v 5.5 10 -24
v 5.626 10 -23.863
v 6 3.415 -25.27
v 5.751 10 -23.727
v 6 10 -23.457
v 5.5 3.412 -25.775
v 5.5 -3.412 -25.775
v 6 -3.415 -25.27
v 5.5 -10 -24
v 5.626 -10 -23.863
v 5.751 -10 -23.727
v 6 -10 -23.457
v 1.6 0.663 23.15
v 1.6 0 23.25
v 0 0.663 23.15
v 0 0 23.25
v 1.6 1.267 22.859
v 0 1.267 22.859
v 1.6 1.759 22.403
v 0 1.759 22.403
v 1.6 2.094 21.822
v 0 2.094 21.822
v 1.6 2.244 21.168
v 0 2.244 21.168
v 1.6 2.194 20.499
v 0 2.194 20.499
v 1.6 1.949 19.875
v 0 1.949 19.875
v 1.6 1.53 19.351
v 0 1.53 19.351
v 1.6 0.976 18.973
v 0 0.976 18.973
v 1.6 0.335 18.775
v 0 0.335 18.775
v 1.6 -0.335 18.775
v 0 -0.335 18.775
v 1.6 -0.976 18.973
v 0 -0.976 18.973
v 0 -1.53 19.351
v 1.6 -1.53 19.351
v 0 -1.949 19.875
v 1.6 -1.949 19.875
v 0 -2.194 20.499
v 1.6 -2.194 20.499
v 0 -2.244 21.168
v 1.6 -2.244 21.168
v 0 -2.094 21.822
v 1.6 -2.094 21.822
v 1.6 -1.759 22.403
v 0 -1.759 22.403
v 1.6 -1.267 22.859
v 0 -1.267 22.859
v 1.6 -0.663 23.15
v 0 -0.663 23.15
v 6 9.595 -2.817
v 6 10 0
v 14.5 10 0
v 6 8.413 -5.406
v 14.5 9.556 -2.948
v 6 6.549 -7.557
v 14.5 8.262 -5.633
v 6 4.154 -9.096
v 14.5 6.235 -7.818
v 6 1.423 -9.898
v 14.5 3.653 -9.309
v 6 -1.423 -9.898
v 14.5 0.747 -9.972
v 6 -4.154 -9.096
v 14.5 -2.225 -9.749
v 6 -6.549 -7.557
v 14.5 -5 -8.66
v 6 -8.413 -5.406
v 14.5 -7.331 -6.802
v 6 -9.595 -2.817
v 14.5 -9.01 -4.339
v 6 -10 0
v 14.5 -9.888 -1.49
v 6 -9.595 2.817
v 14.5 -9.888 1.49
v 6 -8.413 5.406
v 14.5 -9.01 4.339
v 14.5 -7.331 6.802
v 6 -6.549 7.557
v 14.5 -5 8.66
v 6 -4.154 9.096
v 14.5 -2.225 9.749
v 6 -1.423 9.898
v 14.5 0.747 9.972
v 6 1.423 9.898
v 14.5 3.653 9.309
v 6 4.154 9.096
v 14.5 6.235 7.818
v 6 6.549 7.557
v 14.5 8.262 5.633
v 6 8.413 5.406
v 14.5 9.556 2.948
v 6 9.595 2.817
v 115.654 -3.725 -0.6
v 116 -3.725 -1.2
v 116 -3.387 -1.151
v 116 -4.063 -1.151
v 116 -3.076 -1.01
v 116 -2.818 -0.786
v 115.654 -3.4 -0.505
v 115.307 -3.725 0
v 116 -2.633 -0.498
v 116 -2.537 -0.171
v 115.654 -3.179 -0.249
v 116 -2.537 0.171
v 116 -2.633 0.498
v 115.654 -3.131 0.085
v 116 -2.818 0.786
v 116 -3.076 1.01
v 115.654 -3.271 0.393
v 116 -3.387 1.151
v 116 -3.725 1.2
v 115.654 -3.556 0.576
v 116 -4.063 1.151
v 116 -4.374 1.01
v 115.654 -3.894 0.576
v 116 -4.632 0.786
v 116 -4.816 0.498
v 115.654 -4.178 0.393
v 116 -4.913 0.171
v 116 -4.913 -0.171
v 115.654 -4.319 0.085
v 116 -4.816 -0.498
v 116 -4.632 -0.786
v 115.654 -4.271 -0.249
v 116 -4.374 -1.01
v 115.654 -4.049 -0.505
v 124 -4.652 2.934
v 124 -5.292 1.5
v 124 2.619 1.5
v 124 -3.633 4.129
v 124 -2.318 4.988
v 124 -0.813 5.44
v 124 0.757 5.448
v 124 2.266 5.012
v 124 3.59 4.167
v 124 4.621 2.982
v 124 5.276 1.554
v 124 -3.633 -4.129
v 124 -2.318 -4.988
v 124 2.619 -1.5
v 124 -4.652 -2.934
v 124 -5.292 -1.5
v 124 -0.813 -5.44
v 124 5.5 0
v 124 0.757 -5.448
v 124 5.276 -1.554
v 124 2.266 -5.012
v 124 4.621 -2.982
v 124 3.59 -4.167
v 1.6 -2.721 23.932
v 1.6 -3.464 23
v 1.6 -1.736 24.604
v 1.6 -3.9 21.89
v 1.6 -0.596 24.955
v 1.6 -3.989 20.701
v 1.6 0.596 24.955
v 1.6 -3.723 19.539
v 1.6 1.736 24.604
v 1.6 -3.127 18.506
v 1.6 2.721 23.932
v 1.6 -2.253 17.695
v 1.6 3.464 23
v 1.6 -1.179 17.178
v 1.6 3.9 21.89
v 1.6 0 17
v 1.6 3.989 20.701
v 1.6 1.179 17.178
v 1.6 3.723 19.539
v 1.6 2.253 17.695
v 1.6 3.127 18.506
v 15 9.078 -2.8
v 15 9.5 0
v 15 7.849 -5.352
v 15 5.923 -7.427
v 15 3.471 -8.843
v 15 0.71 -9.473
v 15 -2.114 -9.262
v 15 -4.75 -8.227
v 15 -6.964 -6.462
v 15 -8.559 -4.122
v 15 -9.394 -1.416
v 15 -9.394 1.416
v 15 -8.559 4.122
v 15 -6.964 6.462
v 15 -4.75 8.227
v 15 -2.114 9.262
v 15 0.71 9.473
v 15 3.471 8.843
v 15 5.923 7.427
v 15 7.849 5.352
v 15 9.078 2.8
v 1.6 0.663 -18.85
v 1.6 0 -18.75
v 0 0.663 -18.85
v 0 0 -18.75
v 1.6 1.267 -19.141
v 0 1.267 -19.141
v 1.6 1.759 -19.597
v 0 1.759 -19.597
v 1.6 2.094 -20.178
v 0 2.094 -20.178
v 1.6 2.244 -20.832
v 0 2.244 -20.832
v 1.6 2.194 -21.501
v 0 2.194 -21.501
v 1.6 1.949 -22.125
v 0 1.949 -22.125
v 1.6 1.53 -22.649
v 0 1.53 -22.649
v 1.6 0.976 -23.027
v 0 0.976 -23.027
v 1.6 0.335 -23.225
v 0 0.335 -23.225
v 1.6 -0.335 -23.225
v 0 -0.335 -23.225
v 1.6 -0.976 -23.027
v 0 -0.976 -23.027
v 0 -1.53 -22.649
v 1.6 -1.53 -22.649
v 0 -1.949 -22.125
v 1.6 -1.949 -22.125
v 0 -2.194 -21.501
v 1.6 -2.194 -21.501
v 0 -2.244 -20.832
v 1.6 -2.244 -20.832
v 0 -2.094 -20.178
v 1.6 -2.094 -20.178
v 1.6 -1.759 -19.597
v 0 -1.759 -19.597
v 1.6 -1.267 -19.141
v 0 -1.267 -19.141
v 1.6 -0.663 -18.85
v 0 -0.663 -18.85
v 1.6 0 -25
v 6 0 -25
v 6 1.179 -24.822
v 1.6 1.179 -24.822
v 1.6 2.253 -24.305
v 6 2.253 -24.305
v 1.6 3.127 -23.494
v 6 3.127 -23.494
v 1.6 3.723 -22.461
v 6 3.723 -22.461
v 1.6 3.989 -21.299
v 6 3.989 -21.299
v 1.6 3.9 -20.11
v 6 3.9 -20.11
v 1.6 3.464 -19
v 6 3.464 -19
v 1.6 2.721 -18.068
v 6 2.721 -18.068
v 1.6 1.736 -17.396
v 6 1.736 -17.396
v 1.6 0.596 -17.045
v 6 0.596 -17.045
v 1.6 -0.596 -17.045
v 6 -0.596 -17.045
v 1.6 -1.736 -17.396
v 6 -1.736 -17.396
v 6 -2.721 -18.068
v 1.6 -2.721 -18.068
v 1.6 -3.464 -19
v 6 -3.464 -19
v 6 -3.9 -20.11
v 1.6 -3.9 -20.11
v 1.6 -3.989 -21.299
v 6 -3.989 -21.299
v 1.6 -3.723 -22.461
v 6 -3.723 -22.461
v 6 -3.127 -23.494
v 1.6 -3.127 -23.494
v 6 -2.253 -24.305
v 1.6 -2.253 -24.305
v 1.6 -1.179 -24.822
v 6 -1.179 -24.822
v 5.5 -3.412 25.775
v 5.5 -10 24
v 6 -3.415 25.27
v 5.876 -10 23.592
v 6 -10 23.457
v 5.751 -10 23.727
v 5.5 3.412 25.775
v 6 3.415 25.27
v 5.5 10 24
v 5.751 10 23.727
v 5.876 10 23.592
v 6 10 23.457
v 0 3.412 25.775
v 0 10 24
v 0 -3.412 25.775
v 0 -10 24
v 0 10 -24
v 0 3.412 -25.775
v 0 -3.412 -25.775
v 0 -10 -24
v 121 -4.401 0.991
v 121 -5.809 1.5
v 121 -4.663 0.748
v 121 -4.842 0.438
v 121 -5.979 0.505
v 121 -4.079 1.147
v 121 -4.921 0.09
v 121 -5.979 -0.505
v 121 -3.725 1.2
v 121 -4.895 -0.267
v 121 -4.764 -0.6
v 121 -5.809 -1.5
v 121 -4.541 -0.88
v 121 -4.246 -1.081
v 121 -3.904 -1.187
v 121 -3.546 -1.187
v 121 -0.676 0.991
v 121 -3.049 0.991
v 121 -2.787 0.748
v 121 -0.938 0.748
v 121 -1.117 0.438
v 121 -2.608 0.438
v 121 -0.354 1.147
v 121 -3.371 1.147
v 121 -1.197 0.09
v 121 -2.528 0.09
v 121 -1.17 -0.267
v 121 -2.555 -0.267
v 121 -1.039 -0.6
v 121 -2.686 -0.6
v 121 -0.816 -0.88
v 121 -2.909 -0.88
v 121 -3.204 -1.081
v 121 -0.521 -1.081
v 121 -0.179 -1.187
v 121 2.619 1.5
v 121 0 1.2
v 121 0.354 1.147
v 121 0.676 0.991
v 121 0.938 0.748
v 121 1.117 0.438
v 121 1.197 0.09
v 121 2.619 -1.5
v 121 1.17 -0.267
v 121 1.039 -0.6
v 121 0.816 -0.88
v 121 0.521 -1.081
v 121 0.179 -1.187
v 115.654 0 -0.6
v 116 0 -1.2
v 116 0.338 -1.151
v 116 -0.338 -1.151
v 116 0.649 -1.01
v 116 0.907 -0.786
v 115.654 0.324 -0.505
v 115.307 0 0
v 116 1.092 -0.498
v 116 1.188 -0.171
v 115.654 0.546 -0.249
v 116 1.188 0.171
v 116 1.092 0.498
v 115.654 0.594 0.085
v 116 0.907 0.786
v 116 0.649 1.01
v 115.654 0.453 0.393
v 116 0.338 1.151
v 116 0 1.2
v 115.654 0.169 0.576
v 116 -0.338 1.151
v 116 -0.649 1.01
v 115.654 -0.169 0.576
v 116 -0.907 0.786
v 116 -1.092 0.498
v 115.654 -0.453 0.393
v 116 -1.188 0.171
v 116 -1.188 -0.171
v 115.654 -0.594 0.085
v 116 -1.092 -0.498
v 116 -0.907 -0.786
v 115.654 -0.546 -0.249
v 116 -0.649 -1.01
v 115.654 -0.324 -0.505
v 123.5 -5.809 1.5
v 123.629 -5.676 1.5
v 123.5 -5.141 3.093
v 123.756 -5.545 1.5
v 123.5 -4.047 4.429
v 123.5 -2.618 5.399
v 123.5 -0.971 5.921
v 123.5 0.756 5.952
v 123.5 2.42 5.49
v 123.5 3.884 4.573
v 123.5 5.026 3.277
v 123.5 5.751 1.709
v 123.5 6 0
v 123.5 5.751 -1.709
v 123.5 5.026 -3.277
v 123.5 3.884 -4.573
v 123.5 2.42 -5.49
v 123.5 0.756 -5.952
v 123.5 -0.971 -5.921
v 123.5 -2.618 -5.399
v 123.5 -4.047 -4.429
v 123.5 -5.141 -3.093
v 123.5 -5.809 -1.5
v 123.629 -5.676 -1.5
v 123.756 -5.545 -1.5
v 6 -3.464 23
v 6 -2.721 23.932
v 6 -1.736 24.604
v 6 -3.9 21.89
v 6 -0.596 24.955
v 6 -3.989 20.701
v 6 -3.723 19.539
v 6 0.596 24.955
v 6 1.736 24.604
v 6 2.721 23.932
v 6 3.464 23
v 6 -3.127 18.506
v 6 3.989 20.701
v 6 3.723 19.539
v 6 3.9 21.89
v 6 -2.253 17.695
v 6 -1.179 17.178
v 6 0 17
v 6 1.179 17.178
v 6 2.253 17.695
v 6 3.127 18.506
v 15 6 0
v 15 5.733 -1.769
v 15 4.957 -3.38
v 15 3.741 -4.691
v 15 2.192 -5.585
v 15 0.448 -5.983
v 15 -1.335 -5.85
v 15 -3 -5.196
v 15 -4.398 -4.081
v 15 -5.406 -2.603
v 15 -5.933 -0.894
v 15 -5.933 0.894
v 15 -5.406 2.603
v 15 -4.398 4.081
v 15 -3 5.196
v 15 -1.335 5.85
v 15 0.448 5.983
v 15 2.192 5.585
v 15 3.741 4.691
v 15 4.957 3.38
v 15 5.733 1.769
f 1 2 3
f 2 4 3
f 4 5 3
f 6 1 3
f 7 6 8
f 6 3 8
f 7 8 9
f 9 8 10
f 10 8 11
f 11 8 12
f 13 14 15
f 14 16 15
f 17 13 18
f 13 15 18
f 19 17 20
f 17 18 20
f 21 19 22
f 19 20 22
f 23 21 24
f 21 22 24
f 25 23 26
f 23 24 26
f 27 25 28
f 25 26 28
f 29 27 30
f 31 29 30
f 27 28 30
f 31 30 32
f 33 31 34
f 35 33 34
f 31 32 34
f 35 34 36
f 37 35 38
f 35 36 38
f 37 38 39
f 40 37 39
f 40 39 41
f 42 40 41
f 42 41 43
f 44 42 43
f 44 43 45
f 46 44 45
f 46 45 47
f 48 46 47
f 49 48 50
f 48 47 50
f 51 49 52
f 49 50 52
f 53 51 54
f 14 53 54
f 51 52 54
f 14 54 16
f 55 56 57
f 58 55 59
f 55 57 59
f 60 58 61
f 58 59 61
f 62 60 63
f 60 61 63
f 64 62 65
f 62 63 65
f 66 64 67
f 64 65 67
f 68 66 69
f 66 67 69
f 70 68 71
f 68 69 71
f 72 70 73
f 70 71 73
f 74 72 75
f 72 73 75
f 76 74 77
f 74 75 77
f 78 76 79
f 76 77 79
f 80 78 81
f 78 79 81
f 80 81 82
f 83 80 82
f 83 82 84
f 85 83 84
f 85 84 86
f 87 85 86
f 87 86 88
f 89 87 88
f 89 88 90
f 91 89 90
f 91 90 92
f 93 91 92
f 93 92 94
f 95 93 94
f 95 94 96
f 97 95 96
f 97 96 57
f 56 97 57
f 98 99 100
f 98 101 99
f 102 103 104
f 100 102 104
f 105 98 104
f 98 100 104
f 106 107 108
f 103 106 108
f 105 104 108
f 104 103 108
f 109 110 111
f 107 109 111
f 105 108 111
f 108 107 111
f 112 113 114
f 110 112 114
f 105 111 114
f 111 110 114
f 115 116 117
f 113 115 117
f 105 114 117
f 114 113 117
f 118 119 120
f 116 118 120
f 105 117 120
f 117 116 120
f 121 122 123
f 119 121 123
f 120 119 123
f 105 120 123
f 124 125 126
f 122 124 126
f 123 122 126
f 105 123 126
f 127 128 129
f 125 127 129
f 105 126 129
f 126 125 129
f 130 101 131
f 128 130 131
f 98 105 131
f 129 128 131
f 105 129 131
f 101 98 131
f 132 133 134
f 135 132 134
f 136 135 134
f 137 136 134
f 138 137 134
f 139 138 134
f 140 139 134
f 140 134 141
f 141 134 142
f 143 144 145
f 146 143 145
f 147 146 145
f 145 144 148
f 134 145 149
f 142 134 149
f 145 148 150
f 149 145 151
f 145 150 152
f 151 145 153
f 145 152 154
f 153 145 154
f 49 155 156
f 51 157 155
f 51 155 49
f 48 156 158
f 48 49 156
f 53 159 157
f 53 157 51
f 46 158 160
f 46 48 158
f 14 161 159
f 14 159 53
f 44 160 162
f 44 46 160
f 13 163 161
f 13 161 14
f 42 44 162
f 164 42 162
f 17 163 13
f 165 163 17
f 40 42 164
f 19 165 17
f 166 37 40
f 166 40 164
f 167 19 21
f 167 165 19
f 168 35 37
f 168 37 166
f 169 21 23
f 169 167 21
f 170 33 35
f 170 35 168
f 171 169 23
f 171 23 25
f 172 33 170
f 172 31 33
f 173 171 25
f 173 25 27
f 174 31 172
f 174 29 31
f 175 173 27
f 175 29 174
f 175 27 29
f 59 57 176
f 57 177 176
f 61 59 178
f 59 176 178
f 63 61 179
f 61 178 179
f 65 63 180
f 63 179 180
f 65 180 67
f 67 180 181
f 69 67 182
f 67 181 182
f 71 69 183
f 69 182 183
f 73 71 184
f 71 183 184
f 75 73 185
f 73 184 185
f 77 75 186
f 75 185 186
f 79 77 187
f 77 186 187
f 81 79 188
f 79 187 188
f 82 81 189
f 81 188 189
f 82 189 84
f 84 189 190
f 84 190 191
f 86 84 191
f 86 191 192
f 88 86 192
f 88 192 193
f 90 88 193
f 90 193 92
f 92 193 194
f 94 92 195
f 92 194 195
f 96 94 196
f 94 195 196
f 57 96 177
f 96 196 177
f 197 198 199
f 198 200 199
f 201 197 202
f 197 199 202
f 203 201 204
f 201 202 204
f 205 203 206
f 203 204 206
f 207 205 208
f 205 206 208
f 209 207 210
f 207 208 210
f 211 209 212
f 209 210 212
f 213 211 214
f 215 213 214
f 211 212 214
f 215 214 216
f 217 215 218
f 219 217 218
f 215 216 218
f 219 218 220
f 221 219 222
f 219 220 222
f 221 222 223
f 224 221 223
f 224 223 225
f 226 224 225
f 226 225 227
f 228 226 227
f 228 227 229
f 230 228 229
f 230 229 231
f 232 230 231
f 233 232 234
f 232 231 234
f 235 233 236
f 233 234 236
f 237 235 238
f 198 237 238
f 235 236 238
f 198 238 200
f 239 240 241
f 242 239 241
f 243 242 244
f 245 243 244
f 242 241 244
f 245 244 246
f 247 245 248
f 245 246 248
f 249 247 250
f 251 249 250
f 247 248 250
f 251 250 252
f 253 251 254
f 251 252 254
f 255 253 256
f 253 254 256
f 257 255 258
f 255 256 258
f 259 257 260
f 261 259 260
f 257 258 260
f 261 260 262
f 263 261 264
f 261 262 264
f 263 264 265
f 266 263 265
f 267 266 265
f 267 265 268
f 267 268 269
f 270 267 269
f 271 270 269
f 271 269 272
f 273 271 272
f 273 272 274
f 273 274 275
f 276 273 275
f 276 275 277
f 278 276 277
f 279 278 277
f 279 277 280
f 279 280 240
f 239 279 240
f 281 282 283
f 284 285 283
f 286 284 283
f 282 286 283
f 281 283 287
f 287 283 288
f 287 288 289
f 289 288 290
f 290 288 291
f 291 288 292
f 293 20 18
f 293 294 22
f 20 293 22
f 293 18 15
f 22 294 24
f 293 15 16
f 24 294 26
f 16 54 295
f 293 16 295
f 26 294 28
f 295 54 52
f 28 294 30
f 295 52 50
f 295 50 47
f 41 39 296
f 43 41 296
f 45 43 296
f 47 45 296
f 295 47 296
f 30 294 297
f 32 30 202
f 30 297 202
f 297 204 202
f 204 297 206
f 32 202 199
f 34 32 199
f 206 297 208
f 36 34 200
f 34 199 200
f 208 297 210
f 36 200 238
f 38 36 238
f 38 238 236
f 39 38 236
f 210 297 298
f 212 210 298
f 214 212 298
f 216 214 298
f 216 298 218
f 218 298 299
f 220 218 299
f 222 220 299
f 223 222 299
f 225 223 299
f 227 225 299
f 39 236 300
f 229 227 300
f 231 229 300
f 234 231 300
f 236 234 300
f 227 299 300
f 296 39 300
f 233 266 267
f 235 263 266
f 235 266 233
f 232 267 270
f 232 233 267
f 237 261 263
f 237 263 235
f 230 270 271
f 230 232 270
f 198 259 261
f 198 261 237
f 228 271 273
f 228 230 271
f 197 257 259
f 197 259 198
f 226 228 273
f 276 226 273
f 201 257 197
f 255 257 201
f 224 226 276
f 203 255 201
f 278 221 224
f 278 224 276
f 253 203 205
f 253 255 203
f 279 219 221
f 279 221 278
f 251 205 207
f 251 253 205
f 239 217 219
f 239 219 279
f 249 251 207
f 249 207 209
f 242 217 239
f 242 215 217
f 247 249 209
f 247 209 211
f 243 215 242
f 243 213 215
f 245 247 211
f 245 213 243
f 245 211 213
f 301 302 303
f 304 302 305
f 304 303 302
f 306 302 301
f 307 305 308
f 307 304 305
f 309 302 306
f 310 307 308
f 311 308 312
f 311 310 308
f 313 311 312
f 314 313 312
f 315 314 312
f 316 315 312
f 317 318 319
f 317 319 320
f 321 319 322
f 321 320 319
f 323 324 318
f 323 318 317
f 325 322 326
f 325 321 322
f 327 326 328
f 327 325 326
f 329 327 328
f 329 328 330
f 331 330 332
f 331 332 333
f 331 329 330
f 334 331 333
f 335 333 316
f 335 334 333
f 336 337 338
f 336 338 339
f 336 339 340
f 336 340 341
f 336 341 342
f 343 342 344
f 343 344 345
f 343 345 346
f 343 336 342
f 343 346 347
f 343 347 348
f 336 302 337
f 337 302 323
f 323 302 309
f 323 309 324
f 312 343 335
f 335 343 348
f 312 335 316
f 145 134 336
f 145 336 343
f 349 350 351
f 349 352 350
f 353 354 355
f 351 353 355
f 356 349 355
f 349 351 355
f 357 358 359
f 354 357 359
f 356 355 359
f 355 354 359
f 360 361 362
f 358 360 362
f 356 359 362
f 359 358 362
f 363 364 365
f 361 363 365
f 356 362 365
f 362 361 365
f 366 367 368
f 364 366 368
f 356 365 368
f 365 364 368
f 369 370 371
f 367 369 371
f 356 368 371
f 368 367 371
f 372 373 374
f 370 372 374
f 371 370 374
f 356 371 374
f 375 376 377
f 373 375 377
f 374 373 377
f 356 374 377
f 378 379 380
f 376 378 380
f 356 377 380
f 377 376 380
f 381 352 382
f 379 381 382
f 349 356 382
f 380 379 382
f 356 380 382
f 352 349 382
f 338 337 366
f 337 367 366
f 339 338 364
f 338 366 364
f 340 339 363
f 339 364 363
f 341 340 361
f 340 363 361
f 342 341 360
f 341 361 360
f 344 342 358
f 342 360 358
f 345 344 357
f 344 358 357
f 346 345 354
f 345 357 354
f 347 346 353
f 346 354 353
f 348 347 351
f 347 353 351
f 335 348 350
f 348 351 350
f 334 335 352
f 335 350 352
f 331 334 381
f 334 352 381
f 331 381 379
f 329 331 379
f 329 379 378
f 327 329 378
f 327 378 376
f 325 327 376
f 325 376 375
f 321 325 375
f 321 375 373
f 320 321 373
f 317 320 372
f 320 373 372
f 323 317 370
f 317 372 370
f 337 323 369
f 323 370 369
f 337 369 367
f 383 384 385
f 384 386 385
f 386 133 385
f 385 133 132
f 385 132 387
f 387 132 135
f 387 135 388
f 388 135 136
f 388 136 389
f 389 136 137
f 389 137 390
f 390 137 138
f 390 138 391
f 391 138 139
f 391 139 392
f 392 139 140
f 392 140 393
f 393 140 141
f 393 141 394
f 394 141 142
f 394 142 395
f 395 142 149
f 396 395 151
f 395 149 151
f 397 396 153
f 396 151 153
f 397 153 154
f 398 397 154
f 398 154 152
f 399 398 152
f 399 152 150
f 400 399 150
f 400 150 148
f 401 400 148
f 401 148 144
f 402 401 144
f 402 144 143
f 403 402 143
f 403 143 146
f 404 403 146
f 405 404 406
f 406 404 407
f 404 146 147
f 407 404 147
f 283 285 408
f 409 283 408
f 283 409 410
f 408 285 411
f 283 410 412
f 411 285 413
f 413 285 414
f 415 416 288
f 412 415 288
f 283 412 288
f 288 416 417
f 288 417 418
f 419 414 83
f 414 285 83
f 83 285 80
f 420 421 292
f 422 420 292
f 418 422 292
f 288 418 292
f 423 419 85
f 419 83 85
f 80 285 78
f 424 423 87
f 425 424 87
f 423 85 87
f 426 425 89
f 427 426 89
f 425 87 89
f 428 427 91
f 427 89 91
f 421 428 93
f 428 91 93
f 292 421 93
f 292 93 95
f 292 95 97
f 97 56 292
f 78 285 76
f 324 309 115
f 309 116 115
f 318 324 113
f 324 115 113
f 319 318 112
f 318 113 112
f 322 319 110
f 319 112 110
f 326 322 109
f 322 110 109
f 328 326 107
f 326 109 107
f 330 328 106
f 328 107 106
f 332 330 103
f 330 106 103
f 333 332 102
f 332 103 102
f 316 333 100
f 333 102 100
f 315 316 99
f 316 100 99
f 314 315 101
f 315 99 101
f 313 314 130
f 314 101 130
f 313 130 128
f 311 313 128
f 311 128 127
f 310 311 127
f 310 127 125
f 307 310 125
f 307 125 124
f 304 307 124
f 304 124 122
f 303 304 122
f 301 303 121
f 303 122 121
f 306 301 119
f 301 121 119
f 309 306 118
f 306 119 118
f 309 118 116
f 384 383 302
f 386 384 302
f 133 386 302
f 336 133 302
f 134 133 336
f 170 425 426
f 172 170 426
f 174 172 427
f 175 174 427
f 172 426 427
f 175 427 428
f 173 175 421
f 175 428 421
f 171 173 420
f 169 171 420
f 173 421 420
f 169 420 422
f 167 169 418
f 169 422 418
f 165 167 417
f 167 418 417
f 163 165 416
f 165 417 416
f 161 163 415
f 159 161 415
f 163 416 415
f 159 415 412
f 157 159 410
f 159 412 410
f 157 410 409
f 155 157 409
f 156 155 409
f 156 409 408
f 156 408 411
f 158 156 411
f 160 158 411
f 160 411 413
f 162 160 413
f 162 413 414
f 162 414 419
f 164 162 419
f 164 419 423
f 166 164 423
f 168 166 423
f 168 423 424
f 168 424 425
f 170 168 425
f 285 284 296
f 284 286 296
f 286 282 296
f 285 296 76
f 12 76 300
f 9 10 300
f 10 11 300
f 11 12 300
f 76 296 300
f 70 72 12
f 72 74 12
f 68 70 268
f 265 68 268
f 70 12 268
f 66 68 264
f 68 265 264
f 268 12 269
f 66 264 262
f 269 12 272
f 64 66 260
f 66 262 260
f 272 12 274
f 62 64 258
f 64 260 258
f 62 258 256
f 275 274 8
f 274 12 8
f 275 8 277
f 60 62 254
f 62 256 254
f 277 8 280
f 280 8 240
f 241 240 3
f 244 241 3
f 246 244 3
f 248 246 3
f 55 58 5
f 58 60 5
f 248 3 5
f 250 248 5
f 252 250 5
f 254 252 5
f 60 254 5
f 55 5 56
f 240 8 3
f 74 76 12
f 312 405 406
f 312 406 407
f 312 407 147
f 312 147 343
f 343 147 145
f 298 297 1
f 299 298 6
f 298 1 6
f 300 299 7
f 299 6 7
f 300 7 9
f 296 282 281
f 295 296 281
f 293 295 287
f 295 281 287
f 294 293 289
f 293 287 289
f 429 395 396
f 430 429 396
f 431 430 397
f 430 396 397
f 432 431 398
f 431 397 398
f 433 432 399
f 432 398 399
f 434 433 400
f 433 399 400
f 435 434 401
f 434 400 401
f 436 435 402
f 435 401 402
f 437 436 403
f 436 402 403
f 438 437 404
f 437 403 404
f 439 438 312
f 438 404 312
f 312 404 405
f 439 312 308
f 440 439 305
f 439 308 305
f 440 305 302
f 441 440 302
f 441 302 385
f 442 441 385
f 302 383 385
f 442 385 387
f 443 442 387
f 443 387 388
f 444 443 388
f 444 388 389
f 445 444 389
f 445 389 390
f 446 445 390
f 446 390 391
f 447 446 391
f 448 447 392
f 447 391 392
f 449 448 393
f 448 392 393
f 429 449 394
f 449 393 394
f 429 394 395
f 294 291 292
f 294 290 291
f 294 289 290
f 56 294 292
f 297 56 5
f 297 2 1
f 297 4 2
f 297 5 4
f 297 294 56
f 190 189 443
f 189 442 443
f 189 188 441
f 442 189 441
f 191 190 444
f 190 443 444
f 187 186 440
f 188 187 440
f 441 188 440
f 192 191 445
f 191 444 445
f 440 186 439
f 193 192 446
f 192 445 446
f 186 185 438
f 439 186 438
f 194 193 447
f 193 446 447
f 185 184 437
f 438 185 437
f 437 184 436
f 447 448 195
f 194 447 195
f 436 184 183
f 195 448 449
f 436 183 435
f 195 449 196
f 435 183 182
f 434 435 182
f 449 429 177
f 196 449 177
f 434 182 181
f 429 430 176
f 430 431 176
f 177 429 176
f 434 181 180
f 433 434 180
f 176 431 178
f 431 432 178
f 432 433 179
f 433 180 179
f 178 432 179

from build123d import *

# Parameters (mm, degrees)
CHANFREIN1_SIZE                                    = 0.5
CHAMBRAGE_POUR_VIS_T_TE_HEXAGONALE_M41_D           = 4.5
CHAMBRAGE_POUR_VIS_T_TE_HEXAGONALE_M41_CBORE_D     = 8
CHAMBRAGE_POUR_VIS_T_TE_HEXAGONALE_M41_CBORE_DEPTH = 4.4
ENL_V_MAT_EXTRU_2_DEPTH                            = 130.336769714
CHANFREIN3_SIZE                                    = 0.5
ESQUISSE12_W                                       = 3
ESQUISSE12_H                                       = 11.621091342
ENL_V_MAT_EXTRU_3_DEPTH                            = 3
D_GAGEMENT_M21_D                                   = 2.4
D_GAGEMENT_M21_DEPTH                               = 5
D_GAGEMENT_M21_TIP                                 = 0.692820323


with BuildPart() as part:
    # Esquisse1 → Révolution1 (revolve)
    with BuildSketch(Plane.XY):
        Polygon((15, 6), (124, 6), (124, 0), (0, 0), (0, 26), (6, 26), (6, 10), (15, 10), align=None)
    revolve(axis=Axis((124, 0, 0), (-1, 0, 0)))

    # Chanfrein1
    chanfrein1_edges = [part.edges().sort_by_distance(p)[0] for p in [
        (6, -26, 0),
        (15, -10, 0),
    ]]
    chamfer(chanfrein1_edges, length=CHANFREIN1_SIZE)

    # Chambrage pour vis à tête hexagonale M41 (through all)
    with Locations(Plane(origin=(6, 0, 0), x_dir=(0, 0, -1), z_dir=(1, 0, 0))):
        with Locations((-21, 0), (21, 0)):
            CounterBoreHole(CHAMBRAGE_POUR_VIS_T_TE_HEXAGONALE_M41_D / 2, CHAMBRAGE_POUR_VIS_T_TE_HEXAGONALE_M41_CBORE_D / 2, CHAMBRAGE_POUR_VIS_T_TE_HEXAGONALE_M41_CBORE_DEPTH)

    # Esquisse11 → Enlèv. mat.-Extru.2 (cut, through all)
    with BuildSketch(Plane.ZY):
        with BuildLine():
            Line((24, -10), (-24, -10))
            ThreePointArc((-24, -10), (0, -26), (24, -10))
        make_face()
        with BuildLine():
            Line((24, 10), (-24, 10))
            ThreePointArc((-24, 10), (0, 26), (24, 10))
        make_face()
    extrude(amount=-ENL_V_MAT_EXTRU_2_DEPTH, mode=Mode.SUBTRACT)

    # Chanfrein3
    chanfrein3_edges = [part.edges().sort_by_distance(p)[0] for p in [
        (124, -6, 0),
    ]]
    chamfer(chanfrein3_edges, length=CHANFREIN3_SIZE)

    # Esquisse12 → Enlèv. mat.-Extru.3 (cut)
    with BuildSketch(Plane(origin=(124, 0, 0), x_dir=(0, 0, -1), z_dir=(1, 0, 0))):
        with Locations((0, -3.191920072)):
            Rectangle(ESQUISSE12_W, ESQUISSE12_H)
    extrude(amount=-ENL_V_MAT_EXTRU_3_DEPTH, mode=Mode.SUBTRACT)

    # Dégagement M21
    with Locations(Plane(origin=(121, 0, 0), x_dir=(0, 0, -1), z_dir=(1, 0, 0))):
        with Locations((0, 0), (0, -3.724850959)):
            Hole(D_GAGEMENT_M21_D / 2, depth=D_GAGEMENT_M21_DEPTH)
            with Locations((0, 0, -(D_GAGEMENT_M21_DEPTH + D_GAGEMENT_M21_TIP / 2))):  # 120° drill point
                Cone(0, D_GAGEMENT_M21_D / 2, D_GAGEMENT_M21_TIP, mode=Mode.SUBTRACT)


solid = part.part
